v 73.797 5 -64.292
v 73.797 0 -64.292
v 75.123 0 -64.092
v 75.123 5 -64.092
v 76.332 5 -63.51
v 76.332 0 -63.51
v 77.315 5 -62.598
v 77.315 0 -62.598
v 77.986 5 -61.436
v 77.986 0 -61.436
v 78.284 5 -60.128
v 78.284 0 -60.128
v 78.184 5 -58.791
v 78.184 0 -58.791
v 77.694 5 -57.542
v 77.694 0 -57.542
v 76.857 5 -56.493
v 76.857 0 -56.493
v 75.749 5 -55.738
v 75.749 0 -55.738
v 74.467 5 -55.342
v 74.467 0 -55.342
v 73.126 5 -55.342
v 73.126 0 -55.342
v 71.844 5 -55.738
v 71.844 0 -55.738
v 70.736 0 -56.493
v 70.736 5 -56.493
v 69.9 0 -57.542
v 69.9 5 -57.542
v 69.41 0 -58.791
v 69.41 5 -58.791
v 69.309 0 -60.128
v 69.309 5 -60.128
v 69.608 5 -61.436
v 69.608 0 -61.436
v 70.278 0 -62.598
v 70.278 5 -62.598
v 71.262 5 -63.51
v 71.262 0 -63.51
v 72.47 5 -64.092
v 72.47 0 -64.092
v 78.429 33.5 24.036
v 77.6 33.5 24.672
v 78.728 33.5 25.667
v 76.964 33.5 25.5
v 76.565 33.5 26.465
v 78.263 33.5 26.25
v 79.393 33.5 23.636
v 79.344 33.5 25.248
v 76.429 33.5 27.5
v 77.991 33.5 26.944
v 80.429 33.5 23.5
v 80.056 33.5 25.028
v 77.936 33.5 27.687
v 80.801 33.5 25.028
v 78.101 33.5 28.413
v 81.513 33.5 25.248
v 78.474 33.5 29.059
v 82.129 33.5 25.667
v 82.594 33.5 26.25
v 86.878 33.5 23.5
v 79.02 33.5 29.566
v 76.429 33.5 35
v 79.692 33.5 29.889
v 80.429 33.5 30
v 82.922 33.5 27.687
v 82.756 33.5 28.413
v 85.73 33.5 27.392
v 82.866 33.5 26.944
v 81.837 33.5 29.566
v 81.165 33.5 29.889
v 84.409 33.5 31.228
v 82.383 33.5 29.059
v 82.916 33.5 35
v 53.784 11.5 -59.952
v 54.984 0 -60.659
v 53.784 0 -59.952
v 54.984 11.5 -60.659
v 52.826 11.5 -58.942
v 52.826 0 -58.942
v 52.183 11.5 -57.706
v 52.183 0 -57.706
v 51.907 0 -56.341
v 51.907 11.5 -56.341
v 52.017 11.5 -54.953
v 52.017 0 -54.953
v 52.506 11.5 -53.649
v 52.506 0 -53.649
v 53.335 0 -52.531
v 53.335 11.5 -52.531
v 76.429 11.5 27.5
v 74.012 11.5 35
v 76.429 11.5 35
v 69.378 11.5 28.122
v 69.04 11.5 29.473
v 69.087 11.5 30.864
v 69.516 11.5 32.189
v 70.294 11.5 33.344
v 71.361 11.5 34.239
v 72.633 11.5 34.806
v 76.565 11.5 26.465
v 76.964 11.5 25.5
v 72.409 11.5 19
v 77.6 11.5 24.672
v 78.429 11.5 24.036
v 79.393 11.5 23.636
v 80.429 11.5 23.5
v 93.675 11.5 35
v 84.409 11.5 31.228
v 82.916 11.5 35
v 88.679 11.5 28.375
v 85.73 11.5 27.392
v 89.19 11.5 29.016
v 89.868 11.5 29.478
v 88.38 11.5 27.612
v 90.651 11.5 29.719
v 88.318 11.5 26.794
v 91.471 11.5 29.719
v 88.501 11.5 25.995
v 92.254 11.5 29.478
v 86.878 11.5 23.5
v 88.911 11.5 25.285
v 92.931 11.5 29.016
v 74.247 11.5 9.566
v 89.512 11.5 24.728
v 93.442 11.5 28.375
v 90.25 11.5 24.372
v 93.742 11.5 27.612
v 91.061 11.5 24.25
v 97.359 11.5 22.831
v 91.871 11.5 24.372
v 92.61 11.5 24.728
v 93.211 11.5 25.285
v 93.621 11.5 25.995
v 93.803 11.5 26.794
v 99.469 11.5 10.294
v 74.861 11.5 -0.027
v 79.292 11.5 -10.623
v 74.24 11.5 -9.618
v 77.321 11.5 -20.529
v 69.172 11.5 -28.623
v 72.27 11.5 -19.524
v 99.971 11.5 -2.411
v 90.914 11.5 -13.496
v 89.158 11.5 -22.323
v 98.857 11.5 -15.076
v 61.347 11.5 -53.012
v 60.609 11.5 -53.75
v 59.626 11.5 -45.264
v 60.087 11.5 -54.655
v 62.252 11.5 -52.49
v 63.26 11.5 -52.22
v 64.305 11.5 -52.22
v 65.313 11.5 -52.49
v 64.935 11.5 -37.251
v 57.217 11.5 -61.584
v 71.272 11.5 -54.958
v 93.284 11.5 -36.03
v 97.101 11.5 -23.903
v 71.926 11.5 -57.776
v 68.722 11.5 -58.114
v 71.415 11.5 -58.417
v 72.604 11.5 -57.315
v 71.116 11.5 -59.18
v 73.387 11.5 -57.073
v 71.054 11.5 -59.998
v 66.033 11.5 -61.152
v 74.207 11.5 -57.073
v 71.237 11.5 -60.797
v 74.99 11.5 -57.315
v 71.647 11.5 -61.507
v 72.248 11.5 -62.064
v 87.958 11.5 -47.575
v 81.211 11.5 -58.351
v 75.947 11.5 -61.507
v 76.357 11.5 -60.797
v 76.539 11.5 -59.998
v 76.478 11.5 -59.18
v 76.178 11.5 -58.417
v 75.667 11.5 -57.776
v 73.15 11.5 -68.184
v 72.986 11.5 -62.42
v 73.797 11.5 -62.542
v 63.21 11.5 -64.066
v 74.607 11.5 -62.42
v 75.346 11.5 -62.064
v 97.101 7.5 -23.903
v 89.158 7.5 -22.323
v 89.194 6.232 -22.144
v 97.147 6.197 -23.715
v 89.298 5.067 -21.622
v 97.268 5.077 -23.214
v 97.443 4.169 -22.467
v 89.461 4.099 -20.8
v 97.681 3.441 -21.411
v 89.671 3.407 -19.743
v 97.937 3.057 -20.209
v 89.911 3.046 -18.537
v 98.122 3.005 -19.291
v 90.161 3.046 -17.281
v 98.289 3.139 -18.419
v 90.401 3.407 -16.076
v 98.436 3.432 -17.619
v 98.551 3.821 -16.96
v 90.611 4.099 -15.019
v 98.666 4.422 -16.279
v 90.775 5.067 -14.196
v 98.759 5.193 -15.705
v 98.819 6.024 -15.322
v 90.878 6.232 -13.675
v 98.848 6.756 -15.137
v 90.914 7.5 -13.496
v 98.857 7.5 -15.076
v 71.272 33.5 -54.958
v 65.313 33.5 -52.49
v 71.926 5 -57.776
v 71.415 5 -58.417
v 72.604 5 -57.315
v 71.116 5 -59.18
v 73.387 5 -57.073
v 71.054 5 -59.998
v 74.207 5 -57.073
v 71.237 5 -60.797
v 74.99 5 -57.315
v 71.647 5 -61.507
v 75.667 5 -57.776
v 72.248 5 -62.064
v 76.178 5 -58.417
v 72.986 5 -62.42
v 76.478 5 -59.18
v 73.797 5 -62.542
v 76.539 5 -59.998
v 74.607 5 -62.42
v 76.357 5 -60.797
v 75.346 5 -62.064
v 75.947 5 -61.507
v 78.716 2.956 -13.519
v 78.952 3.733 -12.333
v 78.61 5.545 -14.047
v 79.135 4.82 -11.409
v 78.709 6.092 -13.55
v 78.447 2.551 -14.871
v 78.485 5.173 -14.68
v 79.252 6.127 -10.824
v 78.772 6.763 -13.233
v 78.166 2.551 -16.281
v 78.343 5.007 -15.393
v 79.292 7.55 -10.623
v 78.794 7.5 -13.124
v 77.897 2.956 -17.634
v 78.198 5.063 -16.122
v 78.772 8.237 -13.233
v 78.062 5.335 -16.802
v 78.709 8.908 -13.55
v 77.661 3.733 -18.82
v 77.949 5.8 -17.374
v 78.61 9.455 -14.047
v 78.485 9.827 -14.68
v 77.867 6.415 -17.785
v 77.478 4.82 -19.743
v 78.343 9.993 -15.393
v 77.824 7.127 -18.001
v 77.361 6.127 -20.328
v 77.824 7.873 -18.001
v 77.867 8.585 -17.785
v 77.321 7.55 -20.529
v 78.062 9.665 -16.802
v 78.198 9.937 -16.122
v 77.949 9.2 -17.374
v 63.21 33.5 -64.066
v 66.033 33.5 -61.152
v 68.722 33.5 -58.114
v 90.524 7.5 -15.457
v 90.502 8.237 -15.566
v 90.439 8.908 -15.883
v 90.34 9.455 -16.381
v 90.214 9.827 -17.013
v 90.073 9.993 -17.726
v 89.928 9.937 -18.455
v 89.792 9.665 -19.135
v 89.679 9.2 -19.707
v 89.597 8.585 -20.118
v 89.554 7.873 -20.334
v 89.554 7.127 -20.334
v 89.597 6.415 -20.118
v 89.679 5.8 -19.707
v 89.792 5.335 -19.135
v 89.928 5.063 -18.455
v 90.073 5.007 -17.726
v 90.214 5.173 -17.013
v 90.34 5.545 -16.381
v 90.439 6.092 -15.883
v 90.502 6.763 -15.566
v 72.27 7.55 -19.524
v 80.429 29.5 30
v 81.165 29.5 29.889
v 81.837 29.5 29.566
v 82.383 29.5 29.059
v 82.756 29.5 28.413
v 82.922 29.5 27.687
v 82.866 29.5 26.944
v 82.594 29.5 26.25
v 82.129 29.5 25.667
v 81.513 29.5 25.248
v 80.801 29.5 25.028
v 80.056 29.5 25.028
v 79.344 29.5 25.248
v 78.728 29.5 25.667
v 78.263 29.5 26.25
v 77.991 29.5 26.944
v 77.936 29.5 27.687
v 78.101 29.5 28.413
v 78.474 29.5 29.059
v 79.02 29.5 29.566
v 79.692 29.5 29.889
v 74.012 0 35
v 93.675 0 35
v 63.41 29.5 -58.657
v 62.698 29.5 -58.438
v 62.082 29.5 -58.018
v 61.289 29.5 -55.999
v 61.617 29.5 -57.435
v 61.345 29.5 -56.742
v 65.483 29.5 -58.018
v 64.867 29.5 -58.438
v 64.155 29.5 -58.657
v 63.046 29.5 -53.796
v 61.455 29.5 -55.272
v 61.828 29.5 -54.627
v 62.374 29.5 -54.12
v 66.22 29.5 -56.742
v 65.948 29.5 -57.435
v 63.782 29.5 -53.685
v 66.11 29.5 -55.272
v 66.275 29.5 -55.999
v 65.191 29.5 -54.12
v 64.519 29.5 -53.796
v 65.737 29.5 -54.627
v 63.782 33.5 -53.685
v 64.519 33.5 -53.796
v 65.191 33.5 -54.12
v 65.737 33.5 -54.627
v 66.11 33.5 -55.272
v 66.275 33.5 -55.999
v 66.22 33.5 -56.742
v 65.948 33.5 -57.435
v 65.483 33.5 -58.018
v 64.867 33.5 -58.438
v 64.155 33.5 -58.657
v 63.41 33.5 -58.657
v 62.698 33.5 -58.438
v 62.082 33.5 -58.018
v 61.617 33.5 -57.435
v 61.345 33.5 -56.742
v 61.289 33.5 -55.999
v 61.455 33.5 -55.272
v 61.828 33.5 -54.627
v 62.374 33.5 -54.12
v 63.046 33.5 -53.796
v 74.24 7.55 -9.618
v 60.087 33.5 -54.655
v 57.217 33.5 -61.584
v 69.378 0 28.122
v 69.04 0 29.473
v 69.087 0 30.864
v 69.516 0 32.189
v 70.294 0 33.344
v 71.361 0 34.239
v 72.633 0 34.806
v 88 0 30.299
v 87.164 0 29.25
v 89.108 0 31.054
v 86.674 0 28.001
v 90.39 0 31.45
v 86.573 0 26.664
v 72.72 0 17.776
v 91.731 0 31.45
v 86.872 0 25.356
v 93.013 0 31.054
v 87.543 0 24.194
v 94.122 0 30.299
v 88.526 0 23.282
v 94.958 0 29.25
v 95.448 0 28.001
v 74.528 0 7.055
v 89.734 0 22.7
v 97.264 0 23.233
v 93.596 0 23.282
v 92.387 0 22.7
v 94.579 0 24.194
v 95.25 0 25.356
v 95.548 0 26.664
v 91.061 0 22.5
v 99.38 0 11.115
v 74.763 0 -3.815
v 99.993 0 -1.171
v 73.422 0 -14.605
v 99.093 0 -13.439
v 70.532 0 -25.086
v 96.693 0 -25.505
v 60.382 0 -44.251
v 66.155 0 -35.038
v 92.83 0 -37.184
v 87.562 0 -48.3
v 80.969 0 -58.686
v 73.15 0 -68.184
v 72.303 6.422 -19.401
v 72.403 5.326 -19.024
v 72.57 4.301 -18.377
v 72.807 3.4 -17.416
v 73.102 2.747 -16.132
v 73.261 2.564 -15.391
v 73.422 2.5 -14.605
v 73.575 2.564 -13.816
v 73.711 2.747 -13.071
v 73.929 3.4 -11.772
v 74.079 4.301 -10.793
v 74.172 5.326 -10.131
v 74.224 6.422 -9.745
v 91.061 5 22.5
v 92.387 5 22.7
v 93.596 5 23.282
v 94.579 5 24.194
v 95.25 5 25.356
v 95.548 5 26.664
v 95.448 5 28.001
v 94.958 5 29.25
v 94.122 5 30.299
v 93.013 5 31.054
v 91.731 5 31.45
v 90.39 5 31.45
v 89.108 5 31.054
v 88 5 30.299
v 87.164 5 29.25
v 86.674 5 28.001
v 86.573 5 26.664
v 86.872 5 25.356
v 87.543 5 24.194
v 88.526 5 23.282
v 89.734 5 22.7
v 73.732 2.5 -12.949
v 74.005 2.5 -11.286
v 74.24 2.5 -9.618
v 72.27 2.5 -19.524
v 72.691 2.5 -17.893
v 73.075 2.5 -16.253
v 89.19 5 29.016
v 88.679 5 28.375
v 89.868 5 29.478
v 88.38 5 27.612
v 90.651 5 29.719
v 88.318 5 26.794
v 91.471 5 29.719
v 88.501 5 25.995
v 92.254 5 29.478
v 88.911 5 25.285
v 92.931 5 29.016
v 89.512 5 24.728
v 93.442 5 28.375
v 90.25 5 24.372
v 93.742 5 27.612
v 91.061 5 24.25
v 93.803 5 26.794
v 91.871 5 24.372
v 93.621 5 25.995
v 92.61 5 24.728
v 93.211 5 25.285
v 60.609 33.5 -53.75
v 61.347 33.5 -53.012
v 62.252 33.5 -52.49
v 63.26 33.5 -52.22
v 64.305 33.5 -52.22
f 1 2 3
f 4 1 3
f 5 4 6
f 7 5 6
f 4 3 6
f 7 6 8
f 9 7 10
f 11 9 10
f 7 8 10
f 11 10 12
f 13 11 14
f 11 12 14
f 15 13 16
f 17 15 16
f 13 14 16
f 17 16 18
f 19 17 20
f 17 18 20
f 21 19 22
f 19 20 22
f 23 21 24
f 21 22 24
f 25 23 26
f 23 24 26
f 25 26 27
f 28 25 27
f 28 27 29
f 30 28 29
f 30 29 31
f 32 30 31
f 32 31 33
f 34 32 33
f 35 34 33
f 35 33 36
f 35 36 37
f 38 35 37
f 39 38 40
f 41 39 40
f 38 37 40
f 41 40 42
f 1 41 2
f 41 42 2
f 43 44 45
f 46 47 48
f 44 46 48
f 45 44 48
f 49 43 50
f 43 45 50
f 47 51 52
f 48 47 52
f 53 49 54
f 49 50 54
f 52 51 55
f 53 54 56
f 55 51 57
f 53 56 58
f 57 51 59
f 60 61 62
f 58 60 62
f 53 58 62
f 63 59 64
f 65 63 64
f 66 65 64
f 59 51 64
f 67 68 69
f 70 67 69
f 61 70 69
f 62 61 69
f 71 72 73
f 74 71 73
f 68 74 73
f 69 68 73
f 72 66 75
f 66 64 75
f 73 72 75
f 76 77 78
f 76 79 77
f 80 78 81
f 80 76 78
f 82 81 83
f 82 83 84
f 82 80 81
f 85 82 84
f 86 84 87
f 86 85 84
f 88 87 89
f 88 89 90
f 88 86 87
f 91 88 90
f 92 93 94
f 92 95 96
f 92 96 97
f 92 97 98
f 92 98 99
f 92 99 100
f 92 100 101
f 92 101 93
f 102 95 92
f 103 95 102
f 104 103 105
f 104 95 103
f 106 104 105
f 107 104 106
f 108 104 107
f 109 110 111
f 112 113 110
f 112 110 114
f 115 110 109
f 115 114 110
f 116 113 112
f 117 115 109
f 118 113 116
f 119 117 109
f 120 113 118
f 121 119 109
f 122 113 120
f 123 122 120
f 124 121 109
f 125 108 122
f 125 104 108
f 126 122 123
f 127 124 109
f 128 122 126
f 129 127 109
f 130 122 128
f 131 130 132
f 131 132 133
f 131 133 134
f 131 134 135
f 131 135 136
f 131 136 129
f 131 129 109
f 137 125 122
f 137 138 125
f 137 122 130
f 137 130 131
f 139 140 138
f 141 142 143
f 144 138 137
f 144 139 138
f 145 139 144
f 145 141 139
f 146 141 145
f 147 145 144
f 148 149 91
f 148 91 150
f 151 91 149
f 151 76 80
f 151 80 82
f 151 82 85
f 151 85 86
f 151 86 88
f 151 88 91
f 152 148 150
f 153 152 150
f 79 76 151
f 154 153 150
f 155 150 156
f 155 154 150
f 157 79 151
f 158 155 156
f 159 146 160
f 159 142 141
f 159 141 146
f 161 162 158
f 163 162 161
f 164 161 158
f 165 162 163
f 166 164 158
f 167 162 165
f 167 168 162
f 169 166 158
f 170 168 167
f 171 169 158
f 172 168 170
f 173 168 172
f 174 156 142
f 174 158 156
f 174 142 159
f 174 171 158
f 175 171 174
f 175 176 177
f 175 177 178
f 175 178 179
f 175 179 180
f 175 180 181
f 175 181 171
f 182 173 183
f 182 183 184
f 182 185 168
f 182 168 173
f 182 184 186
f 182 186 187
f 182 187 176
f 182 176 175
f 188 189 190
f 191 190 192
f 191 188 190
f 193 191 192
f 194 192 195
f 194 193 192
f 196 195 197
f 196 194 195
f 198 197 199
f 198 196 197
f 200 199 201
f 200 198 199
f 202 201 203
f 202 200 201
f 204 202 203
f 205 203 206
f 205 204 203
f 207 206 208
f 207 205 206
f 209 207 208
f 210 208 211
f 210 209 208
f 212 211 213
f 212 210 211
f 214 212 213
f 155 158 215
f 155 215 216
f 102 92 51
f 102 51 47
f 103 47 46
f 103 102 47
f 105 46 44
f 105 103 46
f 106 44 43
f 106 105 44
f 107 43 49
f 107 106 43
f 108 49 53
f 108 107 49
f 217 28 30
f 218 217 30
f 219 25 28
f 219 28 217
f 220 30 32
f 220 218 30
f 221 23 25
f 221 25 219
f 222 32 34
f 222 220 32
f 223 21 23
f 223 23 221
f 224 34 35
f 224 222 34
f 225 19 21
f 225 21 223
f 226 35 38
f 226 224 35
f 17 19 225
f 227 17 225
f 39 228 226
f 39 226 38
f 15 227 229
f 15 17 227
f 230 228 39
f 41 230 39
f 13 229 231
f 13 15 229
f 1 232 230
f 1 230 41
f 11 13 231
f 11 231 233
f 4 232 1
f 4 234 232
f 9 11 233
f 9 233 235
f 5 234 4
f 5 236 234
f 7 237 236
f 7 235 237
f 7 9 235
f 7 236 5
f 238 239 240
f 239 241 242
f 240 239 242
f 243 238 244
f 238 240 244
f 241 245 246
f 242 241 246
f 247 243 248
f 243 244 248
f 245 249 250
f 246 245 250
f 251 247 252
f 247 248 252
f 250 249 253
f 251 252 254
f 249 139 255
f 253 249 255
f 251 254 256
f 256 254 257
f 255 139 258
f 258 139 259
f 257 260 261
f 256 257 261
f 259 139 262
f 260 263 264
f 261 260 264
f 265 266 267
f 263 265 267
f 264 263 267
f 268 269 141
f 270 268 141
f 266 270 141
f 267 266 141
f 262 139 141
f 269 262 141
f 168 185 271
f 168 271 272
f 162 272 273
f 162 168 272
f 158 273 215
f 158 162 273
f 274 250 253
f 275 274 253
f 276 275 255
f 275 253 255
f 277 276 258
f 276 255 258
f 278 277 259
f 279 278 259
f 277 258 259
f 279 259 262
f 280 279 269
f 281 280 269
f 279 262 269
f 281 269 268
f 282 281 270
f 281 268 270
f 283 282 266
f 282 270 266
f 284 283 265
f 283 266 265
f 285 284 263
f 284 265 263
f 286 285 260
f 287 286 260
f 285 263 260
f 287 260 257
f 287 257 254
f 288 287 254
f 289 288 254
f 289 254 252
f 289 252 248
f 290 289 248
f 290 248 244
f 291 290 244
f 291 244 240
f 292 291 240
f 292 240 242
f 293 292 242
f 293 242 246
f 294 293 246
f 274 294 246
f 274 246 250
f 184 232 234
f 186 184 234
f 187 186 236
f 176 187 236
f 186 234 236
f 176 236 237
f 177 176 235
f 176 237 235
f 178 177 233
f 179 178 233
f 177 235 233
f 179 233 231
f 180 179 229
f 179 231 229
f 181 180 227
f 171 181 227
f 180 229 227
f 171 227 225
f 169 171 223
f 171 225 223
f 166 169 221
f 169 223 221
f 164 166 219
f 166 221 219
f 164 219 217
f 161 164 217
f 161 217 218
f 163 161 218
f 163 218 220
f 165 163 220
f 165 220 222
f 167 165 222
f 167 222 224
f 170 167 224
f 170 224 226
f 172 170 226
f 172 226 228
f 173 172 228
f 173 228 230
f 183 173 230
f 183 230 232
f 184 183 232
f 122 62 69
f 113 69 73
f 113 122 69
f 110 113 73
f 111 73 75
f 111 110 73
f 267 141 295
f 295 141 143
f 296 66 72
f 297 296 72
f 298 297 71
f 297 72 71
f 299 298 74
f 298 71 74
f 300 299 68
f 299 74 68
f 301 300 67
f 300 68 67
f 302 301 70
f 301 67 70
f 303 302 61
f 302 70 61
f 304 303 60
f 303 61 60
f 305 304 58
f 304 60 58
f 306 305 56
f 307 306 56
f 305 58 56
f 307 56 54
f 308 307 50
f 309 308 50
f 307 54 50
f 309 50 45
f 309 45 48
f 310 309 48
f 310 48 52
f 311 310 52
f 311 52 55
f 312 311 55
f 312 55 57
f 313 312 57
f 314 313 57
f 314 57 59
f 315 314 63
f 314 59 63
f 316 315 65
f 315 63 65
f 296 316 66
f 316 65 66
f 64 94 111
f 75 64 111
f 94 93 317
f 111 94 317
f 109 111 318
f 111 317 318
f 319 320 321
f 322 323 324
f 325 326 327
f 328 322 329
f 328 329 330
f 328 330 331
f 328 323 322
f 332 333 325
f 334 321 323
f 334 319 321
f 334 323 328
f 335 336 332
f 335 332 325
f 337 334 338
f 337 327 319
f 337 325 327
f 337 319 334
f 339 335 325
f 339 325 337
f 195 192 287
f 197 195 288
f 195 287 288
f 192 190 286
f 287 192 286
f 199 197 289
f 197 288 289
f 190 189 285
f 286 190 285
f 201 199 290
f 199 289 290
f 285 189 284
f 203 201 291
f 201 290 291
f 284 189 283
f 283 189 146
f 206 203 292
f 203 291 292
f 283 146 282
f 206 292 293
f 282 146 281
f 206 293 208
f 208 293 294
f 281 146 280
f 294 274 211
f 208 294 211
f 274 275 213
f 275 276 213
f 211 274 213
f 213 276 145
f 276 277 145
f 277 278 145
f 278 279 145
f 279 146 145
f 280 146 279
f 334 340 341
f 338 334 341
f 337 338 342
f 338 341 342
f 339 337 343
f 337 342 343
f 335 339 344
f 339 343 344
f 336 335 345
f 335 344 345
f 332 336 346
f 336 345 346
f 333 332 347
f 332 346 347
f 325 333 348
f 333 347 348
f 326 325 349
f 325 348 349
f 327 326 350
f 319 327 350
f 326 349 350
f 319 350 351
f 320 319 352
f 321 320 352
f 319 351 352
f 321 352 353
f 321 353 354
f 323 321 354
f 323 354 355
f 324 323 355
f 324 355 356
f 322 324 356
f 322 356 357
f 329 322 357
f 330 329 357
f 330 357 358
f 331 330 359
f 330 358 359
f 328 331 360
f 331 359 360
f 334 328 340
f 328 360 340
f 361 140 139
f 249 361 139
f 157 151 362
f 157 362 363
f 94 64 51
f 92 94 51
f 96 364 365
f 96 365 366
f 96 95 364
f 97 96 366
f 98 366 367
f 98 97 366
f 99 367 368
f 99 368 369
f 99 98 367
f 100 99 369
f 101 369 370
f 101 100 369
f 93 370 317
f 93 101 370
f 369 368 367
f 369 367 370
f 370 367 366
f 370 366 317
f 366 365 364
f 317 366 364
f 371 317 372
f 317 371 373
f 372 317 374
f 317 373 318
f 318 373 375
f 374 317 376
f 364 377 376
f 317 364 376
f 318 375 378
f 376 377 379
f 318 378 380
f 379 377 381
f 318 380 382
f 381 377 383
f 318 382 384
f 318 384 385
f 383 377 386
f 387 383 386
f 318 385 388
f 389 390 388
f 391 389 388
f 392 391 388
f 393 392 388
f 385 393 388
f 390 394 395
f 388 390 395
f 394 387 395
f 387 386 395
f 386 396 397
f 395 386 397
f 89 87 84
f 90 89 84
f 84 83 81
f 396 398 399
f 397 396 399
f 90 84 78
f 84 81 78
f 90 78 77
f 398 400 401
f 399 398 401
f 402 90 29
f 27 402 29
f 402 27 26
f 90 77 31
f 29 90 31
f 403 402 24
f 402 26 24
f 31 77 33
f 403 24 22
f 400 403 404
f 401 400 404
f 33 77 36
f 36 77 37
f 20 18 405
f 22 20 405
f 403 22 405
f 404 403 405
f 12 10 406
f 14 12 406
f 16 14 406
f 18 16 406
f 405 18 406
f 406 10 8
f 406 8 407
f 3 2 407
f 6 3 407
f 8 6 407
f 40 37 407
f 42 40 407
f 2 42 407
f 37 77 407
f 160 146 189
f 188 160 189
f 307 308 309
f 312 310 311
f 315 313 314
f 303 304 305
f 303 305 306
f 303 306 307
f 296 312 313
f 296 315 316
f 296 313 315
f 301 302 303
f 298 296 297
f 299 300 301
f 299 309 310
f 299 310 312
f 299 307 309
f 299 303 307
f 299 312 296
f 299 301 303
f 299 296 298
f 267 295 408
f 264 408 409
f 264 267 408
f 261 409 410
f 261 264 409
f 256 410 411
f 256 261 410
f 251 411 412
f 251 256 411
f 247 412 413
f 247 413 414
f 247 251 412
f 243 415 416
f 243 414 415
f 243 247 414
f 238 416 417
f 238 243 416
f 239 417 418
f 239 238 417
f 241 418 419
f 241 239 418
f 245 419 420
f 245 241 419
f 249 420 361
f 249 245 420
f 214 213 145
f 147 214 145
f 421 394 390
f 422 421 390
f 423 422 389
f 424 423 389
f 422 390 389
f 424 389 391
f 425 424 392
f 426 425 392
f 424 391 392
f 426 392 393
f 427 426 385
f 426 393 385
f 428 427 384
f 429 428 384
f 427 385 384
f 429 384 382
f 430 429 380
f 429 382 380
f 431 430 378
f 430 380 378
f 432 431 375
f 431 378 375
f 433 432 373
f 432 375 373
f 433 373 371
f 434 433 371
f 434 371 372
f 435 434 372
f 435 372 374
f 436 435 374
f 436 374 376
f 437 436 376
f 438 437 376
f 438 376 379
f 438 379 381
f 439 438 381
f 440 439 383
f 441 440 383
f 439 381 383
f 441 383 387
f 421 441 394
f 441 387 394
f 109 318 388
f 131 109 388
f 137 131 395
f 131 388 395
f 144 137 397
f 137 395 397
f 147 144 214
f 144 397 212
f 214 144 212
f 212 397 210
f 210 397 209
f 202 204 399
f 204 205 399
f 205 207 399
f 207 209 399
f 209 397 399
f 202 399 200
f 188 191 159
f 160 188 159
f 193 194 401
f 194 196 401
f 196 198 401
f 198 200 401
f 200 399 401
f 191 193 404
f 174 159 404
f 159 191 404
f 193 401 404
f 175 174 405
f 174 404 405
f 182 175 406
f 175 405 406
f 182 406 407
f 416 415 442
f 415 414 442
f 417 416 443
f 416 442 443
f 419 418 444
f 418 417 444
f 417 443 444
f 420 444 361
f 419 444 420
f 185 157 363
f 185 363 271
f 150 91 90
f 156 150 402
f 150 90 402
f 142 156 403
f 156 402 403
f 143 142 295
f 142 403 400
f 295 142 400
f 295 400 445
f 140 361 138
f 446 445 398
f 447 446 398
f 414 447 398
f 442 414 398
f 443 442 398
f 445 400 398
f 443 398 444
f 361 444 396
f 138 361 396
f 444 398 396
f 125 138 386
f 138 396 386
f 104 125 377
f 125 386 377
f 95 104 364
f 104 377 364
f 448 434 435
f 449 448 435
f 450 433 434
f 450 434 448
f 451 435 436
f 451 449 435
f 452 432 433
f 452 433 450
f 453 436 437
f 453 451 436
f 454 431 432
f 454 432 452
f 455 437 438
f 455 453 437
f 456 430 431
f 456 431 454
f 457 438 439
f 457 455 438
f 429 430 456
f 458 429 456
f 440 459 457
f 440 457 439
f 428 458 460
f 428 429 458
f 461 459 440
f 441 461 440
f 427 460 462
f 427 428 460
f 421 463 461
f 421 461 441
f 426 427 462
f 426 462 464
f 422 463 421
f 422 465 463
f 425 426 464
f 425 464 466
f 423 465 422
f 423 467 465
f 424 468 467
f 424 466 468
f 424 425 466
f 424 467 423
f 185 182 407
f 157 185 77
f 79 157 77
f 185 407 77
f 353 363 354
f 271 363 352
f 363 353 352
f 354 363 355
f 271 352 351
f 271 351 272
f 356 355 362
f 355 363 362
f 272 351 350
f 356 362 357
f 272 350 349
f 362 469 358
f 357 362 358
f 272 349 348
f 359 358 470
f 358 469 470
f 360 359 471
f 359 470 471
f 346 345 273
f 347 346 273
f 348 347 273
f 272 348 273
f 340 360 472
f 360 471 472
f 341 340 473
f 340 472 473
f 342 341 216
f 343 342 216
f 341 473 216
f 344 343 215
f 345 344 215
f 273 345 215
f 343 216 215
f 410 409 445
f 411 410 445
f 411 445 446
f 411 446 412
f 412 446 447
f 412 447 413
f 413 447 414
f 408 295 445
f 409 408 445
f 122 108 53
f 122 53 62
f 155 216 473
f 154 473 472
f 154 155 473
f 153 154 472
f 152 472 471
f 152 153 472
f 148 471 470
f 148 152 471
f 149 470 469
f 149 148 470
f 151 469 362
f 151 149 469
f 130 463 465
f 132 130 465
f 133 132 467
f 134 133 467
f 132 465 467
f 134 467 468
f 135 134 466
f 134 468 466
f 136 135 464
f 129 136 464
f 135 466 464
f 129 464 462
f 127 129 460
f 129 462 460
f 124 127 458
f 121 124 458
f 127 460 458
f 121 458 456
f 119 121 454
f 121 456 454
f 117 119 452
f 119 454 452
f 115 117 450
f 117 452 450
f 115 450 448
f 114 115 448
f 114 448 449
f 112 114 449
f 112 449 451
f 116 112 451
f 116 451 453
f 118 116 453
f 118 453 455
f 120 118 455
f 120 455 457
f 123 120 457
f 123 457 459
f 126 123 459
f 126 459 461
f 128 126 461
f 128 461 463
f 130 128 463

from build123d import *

# Parameters (mm, degrees)
BOSS_EXTRUDE1_DEPTH = 11.5
BOSS_EXTRUDE2_DEPTH = 22
SKETCH3_R           = 2.5
CUT_EXTRUDE1_DEPTH  = 4
SKETCH4_R           = 4.5
CUT_EXTRUDE2_DEPTH  = 5
SKETCH5_R           = 2.75
CUT_EXTRUDE3_DEPTH  = 125.343311555
SKETCH6_R           = 2.5
CUT_EXTRUDE4_DEPTH  = 79.78509189
CUT_EXTRUDE5_DEPTH  = 8.2
CUT_EXTRUDE6_DEPTH  = 9
FILLET1_R           = 5.05
FILLET2_R           = 5


with BuildPart() as part:
    # Sketch1 → Boss-Extrude1 (new body)
    with BuildSketch(Plane(origin=(0, 0, 0), x_dir=(1, 0, 0), z_dir=(0, 1, 0))):
        with BuildLine():
            Line((66.174969976, -35), (93.674969976, -35))
            ThreePointArc((93.674969976, -35), (98.07852804, 19.509032202), (73.150467337, 68.183642675))
            Line((73.150467337, 68.183642675), (47.743780193, 57.659848285))
            ThreePointArc((47.743780193, 57.659848285), (73.422287359, 14.604600997), (66.174969976, -35))
        make_face()
    extrude(amount=BOSS_EXTRUDE1_DEPTH)

    # Sketch2 → Boss-Extrude2 (add)
    with BuildSketch(Plane.XZ.offset(-11.5)):
        with BuildLine():
            Line((80.428539711, 23.5), (86.877787725, 23.5))
            ThreePointArc((86.877787725, 23.5), (85.091202872, 29.317012019), (82.915619759, 35))
            Line((82.915619759, 35), (76.428539711, 35))
            Line((76.428539711, 35), (76.428539711, 27.5))
            ThreePointArc((76.428539711, 27.5), (77.600112586, 24.671572875), (80.428539711, 23.5))
        make_face()
        with BuildLine():
            Line((60.086969148, -54.654623051), (57.216843406, -61.583719545))
            Line((57.216843406, -61.583719545), (63.210123888, -64.066217604))
            ThreePointArc((63.210123888, -64.066217604), (67.394885944, -59.648380938), (71.271549248, -54.957859017))
            Line((71.271549248, -54.957859017), (65.313221008, -52.489838651))
            ThreePointArc((65.313221008, -52.489838651), (62.251753549, -52.489838651), (60.086969148, -54.654623051))
        make_face()
    extrude(amount=-BOSS_EXTRUDE2_DEPTH)

    # Sketch3 → Cut-Extrude1 (cut)
    with BuildSketch(Plane(origin=(0, 33.5, 0), x_dir=(1, 0, 0), z_dir=(0, 1, 0))):
        with Locations(Location((63.782487278, 56.185356781, 0), (0, 0, 270))):
            Circle(SKETCH3_R)
        with Locations(Location((80.428539711, -27.5, 0), (0, 0, 270))):
            Circle(SKETCH3_R)
    extrude(amount=-CUT_EXTRUDE1_DEPTH, mode=Mode.SUBTRACT)

    # Sketch4 → Cut-Extrude2 (cut)
    with BuildSketch(Plane.XZ):
        with Locations(Location((91.060743988, 27, 0), (0, 0, 270))):
            Circle(SKETCH4_R)
        with Locations(Location((73.796704912, -59.792185441, 0), (0, 0, 270))):
            Circle(SKETCH4_R)
    extrude(amount=-CUT_EXTRUDE2_DEPTH, mode=Mode.SUBTRACT)

    # Sketch5 → Cut-Extrude3 (cut, through all)
    with BuildSketch(Plane.XZ.offset(-5)):
        with Locations(Location((91.060743988, 27, 0), (0, 0, 270))):
            Circle(SKETCH5_R)
        with Locations(Location((73.796704912, -59.792185441, 0), (0, 0, 270))):
            Circle(SKETCH5_R)
    extrude(amount=-CUT_EXTRUDE3_DEPTH, mode=Mode.SUBTRACT)

    # Sketch6 → Cut-Extrude4 (cut, through all)
    with BuildSketch(Plane(origin=(56.959375084, 0, -11.329924142), x_dir=(0.19509032201612866, 0, 0.9807852804032304), z_dir=(-0.9807852804032304, 0, 0.19509032201612866))):
        with Locations((0, 7.5)):
            Circle(SKETCH6_R)
    extrude(amount=-CUT_EXTRUDE4_DEPTH, mode=Mode.SUBTRACT)

    # Sketch8 → Cut-Extrude5 (cut)
    with BuildSketch(Plane(origin=(98.07852804, 0, -19.509032202), x_dir=(-0.19509032201612866, 0, -0.9807852804032304), z_dir=(0.9807852804032304, 0, -0.19509032201612866))):
        with BuildLine():
            Line((-4.5, 7.5), (-4.5, 11.5))
            Line((-4.5, 11.5), (4.5, 11.5))
            Line((4.5, 11.5), (4.5, 7.5))
            ThreePointArc((4.5, 7.5), (0, 3), (-4.5, 7.5))
        make_face()
    extrude(amount=-CUT_EXTRUDE5_DEPTH, mode=Mode.SUBTRACT)

    # Sketch7 → Cut-Extrude6 (cut)
    with BuildSketch(Plane(origin=(0, 11.5, 0), x_dir=(1, 0, 0), z_dir=(0, 1, 0))):
        Polygon((69.47485004, 18.968342244), (71.445262293, 9.062410912), (79.291544536, 10.623133488), (77.321132284, 20.52906482), align=None)
    extrude(amount=-CUT_EXTRUDE6_DEPTH, mode=Mode.SUBTRACT)

    # Fillet1
    # the kernel refuses this fillet: 5.05 mm, written as the material it adds along each edge
    with BuildSketch(Plane(origin=(61.857828731, 2.5, -7.155351805), x_dir=(0, 1, 0), z_dir=(0.9807852804032302, 0, -0.1950903220161298))) as fillet1_piece_1_section:
        with BuildLine():
            CenterArc((FILLET1_R, -FILLET1_R), FILLET1_R, 90, 90)
            Line((0, -FILLET1_R), (0, 0))
            Line((0, 0), (FILLET1_R, 0))
        make_face()
    fillet1_piece_1 = extrude(amount=30.40026249, mode=Mode.PRIVATE)
    fillet1_piece_1 = fillet1_piece_1 - Plane(origin=(0, 3.649852304, 0), x_dir=(0.6377681563457176, 0, -0.7702283938880625), z_dir=(0, -1, 0)) * Cylinder(74.860715007, 82, mode=Mode.PRIVATE)
    add(fillet1_piece_1)
    with BuildSketch(Plane(origin=(89.703546449, 2.5, -22.992080135), x_dir=(0, 1, 0), z_dir=(-0.9807852804032304, 0, 0.19509032201612841))) as fillet1_piece_2_section:
        with BuildLine():
            CenterArc((FILLET1_R, -FILLET1_R), FILLET1_R, 90, 90)
            Line((0, -FILLET1_R), (0, 0))
            Line((0, 0), (FILLET1_R, 0))
        make_face()
    fillet1_piece_2 = extrude(amount=30.40026249, mode=Mode.PRIVATE)
    fillet1_piece_2 = fillet1_piece_2 - Plane(origin=(0, 3.643295327, 0), x_dir=(0.6377681563457176, 0, -0.7702283938880625), z_dir=(0, -1, 0)) * Cylinder(74.860715007, 82, mode=Mode.PRIVATE)
    add(fillet1_piece_2)

    # Fillet2
    fillet2_edges = [part.edges().sort_by_distance(p)[0] for p in [
        (66.174969976, 5.75, 35),
        (47.743780193, 5.75, -57.659848285),
    ]]
    fillet(fillet2_edges, radius=FILLET2_R)


solid = part.part
